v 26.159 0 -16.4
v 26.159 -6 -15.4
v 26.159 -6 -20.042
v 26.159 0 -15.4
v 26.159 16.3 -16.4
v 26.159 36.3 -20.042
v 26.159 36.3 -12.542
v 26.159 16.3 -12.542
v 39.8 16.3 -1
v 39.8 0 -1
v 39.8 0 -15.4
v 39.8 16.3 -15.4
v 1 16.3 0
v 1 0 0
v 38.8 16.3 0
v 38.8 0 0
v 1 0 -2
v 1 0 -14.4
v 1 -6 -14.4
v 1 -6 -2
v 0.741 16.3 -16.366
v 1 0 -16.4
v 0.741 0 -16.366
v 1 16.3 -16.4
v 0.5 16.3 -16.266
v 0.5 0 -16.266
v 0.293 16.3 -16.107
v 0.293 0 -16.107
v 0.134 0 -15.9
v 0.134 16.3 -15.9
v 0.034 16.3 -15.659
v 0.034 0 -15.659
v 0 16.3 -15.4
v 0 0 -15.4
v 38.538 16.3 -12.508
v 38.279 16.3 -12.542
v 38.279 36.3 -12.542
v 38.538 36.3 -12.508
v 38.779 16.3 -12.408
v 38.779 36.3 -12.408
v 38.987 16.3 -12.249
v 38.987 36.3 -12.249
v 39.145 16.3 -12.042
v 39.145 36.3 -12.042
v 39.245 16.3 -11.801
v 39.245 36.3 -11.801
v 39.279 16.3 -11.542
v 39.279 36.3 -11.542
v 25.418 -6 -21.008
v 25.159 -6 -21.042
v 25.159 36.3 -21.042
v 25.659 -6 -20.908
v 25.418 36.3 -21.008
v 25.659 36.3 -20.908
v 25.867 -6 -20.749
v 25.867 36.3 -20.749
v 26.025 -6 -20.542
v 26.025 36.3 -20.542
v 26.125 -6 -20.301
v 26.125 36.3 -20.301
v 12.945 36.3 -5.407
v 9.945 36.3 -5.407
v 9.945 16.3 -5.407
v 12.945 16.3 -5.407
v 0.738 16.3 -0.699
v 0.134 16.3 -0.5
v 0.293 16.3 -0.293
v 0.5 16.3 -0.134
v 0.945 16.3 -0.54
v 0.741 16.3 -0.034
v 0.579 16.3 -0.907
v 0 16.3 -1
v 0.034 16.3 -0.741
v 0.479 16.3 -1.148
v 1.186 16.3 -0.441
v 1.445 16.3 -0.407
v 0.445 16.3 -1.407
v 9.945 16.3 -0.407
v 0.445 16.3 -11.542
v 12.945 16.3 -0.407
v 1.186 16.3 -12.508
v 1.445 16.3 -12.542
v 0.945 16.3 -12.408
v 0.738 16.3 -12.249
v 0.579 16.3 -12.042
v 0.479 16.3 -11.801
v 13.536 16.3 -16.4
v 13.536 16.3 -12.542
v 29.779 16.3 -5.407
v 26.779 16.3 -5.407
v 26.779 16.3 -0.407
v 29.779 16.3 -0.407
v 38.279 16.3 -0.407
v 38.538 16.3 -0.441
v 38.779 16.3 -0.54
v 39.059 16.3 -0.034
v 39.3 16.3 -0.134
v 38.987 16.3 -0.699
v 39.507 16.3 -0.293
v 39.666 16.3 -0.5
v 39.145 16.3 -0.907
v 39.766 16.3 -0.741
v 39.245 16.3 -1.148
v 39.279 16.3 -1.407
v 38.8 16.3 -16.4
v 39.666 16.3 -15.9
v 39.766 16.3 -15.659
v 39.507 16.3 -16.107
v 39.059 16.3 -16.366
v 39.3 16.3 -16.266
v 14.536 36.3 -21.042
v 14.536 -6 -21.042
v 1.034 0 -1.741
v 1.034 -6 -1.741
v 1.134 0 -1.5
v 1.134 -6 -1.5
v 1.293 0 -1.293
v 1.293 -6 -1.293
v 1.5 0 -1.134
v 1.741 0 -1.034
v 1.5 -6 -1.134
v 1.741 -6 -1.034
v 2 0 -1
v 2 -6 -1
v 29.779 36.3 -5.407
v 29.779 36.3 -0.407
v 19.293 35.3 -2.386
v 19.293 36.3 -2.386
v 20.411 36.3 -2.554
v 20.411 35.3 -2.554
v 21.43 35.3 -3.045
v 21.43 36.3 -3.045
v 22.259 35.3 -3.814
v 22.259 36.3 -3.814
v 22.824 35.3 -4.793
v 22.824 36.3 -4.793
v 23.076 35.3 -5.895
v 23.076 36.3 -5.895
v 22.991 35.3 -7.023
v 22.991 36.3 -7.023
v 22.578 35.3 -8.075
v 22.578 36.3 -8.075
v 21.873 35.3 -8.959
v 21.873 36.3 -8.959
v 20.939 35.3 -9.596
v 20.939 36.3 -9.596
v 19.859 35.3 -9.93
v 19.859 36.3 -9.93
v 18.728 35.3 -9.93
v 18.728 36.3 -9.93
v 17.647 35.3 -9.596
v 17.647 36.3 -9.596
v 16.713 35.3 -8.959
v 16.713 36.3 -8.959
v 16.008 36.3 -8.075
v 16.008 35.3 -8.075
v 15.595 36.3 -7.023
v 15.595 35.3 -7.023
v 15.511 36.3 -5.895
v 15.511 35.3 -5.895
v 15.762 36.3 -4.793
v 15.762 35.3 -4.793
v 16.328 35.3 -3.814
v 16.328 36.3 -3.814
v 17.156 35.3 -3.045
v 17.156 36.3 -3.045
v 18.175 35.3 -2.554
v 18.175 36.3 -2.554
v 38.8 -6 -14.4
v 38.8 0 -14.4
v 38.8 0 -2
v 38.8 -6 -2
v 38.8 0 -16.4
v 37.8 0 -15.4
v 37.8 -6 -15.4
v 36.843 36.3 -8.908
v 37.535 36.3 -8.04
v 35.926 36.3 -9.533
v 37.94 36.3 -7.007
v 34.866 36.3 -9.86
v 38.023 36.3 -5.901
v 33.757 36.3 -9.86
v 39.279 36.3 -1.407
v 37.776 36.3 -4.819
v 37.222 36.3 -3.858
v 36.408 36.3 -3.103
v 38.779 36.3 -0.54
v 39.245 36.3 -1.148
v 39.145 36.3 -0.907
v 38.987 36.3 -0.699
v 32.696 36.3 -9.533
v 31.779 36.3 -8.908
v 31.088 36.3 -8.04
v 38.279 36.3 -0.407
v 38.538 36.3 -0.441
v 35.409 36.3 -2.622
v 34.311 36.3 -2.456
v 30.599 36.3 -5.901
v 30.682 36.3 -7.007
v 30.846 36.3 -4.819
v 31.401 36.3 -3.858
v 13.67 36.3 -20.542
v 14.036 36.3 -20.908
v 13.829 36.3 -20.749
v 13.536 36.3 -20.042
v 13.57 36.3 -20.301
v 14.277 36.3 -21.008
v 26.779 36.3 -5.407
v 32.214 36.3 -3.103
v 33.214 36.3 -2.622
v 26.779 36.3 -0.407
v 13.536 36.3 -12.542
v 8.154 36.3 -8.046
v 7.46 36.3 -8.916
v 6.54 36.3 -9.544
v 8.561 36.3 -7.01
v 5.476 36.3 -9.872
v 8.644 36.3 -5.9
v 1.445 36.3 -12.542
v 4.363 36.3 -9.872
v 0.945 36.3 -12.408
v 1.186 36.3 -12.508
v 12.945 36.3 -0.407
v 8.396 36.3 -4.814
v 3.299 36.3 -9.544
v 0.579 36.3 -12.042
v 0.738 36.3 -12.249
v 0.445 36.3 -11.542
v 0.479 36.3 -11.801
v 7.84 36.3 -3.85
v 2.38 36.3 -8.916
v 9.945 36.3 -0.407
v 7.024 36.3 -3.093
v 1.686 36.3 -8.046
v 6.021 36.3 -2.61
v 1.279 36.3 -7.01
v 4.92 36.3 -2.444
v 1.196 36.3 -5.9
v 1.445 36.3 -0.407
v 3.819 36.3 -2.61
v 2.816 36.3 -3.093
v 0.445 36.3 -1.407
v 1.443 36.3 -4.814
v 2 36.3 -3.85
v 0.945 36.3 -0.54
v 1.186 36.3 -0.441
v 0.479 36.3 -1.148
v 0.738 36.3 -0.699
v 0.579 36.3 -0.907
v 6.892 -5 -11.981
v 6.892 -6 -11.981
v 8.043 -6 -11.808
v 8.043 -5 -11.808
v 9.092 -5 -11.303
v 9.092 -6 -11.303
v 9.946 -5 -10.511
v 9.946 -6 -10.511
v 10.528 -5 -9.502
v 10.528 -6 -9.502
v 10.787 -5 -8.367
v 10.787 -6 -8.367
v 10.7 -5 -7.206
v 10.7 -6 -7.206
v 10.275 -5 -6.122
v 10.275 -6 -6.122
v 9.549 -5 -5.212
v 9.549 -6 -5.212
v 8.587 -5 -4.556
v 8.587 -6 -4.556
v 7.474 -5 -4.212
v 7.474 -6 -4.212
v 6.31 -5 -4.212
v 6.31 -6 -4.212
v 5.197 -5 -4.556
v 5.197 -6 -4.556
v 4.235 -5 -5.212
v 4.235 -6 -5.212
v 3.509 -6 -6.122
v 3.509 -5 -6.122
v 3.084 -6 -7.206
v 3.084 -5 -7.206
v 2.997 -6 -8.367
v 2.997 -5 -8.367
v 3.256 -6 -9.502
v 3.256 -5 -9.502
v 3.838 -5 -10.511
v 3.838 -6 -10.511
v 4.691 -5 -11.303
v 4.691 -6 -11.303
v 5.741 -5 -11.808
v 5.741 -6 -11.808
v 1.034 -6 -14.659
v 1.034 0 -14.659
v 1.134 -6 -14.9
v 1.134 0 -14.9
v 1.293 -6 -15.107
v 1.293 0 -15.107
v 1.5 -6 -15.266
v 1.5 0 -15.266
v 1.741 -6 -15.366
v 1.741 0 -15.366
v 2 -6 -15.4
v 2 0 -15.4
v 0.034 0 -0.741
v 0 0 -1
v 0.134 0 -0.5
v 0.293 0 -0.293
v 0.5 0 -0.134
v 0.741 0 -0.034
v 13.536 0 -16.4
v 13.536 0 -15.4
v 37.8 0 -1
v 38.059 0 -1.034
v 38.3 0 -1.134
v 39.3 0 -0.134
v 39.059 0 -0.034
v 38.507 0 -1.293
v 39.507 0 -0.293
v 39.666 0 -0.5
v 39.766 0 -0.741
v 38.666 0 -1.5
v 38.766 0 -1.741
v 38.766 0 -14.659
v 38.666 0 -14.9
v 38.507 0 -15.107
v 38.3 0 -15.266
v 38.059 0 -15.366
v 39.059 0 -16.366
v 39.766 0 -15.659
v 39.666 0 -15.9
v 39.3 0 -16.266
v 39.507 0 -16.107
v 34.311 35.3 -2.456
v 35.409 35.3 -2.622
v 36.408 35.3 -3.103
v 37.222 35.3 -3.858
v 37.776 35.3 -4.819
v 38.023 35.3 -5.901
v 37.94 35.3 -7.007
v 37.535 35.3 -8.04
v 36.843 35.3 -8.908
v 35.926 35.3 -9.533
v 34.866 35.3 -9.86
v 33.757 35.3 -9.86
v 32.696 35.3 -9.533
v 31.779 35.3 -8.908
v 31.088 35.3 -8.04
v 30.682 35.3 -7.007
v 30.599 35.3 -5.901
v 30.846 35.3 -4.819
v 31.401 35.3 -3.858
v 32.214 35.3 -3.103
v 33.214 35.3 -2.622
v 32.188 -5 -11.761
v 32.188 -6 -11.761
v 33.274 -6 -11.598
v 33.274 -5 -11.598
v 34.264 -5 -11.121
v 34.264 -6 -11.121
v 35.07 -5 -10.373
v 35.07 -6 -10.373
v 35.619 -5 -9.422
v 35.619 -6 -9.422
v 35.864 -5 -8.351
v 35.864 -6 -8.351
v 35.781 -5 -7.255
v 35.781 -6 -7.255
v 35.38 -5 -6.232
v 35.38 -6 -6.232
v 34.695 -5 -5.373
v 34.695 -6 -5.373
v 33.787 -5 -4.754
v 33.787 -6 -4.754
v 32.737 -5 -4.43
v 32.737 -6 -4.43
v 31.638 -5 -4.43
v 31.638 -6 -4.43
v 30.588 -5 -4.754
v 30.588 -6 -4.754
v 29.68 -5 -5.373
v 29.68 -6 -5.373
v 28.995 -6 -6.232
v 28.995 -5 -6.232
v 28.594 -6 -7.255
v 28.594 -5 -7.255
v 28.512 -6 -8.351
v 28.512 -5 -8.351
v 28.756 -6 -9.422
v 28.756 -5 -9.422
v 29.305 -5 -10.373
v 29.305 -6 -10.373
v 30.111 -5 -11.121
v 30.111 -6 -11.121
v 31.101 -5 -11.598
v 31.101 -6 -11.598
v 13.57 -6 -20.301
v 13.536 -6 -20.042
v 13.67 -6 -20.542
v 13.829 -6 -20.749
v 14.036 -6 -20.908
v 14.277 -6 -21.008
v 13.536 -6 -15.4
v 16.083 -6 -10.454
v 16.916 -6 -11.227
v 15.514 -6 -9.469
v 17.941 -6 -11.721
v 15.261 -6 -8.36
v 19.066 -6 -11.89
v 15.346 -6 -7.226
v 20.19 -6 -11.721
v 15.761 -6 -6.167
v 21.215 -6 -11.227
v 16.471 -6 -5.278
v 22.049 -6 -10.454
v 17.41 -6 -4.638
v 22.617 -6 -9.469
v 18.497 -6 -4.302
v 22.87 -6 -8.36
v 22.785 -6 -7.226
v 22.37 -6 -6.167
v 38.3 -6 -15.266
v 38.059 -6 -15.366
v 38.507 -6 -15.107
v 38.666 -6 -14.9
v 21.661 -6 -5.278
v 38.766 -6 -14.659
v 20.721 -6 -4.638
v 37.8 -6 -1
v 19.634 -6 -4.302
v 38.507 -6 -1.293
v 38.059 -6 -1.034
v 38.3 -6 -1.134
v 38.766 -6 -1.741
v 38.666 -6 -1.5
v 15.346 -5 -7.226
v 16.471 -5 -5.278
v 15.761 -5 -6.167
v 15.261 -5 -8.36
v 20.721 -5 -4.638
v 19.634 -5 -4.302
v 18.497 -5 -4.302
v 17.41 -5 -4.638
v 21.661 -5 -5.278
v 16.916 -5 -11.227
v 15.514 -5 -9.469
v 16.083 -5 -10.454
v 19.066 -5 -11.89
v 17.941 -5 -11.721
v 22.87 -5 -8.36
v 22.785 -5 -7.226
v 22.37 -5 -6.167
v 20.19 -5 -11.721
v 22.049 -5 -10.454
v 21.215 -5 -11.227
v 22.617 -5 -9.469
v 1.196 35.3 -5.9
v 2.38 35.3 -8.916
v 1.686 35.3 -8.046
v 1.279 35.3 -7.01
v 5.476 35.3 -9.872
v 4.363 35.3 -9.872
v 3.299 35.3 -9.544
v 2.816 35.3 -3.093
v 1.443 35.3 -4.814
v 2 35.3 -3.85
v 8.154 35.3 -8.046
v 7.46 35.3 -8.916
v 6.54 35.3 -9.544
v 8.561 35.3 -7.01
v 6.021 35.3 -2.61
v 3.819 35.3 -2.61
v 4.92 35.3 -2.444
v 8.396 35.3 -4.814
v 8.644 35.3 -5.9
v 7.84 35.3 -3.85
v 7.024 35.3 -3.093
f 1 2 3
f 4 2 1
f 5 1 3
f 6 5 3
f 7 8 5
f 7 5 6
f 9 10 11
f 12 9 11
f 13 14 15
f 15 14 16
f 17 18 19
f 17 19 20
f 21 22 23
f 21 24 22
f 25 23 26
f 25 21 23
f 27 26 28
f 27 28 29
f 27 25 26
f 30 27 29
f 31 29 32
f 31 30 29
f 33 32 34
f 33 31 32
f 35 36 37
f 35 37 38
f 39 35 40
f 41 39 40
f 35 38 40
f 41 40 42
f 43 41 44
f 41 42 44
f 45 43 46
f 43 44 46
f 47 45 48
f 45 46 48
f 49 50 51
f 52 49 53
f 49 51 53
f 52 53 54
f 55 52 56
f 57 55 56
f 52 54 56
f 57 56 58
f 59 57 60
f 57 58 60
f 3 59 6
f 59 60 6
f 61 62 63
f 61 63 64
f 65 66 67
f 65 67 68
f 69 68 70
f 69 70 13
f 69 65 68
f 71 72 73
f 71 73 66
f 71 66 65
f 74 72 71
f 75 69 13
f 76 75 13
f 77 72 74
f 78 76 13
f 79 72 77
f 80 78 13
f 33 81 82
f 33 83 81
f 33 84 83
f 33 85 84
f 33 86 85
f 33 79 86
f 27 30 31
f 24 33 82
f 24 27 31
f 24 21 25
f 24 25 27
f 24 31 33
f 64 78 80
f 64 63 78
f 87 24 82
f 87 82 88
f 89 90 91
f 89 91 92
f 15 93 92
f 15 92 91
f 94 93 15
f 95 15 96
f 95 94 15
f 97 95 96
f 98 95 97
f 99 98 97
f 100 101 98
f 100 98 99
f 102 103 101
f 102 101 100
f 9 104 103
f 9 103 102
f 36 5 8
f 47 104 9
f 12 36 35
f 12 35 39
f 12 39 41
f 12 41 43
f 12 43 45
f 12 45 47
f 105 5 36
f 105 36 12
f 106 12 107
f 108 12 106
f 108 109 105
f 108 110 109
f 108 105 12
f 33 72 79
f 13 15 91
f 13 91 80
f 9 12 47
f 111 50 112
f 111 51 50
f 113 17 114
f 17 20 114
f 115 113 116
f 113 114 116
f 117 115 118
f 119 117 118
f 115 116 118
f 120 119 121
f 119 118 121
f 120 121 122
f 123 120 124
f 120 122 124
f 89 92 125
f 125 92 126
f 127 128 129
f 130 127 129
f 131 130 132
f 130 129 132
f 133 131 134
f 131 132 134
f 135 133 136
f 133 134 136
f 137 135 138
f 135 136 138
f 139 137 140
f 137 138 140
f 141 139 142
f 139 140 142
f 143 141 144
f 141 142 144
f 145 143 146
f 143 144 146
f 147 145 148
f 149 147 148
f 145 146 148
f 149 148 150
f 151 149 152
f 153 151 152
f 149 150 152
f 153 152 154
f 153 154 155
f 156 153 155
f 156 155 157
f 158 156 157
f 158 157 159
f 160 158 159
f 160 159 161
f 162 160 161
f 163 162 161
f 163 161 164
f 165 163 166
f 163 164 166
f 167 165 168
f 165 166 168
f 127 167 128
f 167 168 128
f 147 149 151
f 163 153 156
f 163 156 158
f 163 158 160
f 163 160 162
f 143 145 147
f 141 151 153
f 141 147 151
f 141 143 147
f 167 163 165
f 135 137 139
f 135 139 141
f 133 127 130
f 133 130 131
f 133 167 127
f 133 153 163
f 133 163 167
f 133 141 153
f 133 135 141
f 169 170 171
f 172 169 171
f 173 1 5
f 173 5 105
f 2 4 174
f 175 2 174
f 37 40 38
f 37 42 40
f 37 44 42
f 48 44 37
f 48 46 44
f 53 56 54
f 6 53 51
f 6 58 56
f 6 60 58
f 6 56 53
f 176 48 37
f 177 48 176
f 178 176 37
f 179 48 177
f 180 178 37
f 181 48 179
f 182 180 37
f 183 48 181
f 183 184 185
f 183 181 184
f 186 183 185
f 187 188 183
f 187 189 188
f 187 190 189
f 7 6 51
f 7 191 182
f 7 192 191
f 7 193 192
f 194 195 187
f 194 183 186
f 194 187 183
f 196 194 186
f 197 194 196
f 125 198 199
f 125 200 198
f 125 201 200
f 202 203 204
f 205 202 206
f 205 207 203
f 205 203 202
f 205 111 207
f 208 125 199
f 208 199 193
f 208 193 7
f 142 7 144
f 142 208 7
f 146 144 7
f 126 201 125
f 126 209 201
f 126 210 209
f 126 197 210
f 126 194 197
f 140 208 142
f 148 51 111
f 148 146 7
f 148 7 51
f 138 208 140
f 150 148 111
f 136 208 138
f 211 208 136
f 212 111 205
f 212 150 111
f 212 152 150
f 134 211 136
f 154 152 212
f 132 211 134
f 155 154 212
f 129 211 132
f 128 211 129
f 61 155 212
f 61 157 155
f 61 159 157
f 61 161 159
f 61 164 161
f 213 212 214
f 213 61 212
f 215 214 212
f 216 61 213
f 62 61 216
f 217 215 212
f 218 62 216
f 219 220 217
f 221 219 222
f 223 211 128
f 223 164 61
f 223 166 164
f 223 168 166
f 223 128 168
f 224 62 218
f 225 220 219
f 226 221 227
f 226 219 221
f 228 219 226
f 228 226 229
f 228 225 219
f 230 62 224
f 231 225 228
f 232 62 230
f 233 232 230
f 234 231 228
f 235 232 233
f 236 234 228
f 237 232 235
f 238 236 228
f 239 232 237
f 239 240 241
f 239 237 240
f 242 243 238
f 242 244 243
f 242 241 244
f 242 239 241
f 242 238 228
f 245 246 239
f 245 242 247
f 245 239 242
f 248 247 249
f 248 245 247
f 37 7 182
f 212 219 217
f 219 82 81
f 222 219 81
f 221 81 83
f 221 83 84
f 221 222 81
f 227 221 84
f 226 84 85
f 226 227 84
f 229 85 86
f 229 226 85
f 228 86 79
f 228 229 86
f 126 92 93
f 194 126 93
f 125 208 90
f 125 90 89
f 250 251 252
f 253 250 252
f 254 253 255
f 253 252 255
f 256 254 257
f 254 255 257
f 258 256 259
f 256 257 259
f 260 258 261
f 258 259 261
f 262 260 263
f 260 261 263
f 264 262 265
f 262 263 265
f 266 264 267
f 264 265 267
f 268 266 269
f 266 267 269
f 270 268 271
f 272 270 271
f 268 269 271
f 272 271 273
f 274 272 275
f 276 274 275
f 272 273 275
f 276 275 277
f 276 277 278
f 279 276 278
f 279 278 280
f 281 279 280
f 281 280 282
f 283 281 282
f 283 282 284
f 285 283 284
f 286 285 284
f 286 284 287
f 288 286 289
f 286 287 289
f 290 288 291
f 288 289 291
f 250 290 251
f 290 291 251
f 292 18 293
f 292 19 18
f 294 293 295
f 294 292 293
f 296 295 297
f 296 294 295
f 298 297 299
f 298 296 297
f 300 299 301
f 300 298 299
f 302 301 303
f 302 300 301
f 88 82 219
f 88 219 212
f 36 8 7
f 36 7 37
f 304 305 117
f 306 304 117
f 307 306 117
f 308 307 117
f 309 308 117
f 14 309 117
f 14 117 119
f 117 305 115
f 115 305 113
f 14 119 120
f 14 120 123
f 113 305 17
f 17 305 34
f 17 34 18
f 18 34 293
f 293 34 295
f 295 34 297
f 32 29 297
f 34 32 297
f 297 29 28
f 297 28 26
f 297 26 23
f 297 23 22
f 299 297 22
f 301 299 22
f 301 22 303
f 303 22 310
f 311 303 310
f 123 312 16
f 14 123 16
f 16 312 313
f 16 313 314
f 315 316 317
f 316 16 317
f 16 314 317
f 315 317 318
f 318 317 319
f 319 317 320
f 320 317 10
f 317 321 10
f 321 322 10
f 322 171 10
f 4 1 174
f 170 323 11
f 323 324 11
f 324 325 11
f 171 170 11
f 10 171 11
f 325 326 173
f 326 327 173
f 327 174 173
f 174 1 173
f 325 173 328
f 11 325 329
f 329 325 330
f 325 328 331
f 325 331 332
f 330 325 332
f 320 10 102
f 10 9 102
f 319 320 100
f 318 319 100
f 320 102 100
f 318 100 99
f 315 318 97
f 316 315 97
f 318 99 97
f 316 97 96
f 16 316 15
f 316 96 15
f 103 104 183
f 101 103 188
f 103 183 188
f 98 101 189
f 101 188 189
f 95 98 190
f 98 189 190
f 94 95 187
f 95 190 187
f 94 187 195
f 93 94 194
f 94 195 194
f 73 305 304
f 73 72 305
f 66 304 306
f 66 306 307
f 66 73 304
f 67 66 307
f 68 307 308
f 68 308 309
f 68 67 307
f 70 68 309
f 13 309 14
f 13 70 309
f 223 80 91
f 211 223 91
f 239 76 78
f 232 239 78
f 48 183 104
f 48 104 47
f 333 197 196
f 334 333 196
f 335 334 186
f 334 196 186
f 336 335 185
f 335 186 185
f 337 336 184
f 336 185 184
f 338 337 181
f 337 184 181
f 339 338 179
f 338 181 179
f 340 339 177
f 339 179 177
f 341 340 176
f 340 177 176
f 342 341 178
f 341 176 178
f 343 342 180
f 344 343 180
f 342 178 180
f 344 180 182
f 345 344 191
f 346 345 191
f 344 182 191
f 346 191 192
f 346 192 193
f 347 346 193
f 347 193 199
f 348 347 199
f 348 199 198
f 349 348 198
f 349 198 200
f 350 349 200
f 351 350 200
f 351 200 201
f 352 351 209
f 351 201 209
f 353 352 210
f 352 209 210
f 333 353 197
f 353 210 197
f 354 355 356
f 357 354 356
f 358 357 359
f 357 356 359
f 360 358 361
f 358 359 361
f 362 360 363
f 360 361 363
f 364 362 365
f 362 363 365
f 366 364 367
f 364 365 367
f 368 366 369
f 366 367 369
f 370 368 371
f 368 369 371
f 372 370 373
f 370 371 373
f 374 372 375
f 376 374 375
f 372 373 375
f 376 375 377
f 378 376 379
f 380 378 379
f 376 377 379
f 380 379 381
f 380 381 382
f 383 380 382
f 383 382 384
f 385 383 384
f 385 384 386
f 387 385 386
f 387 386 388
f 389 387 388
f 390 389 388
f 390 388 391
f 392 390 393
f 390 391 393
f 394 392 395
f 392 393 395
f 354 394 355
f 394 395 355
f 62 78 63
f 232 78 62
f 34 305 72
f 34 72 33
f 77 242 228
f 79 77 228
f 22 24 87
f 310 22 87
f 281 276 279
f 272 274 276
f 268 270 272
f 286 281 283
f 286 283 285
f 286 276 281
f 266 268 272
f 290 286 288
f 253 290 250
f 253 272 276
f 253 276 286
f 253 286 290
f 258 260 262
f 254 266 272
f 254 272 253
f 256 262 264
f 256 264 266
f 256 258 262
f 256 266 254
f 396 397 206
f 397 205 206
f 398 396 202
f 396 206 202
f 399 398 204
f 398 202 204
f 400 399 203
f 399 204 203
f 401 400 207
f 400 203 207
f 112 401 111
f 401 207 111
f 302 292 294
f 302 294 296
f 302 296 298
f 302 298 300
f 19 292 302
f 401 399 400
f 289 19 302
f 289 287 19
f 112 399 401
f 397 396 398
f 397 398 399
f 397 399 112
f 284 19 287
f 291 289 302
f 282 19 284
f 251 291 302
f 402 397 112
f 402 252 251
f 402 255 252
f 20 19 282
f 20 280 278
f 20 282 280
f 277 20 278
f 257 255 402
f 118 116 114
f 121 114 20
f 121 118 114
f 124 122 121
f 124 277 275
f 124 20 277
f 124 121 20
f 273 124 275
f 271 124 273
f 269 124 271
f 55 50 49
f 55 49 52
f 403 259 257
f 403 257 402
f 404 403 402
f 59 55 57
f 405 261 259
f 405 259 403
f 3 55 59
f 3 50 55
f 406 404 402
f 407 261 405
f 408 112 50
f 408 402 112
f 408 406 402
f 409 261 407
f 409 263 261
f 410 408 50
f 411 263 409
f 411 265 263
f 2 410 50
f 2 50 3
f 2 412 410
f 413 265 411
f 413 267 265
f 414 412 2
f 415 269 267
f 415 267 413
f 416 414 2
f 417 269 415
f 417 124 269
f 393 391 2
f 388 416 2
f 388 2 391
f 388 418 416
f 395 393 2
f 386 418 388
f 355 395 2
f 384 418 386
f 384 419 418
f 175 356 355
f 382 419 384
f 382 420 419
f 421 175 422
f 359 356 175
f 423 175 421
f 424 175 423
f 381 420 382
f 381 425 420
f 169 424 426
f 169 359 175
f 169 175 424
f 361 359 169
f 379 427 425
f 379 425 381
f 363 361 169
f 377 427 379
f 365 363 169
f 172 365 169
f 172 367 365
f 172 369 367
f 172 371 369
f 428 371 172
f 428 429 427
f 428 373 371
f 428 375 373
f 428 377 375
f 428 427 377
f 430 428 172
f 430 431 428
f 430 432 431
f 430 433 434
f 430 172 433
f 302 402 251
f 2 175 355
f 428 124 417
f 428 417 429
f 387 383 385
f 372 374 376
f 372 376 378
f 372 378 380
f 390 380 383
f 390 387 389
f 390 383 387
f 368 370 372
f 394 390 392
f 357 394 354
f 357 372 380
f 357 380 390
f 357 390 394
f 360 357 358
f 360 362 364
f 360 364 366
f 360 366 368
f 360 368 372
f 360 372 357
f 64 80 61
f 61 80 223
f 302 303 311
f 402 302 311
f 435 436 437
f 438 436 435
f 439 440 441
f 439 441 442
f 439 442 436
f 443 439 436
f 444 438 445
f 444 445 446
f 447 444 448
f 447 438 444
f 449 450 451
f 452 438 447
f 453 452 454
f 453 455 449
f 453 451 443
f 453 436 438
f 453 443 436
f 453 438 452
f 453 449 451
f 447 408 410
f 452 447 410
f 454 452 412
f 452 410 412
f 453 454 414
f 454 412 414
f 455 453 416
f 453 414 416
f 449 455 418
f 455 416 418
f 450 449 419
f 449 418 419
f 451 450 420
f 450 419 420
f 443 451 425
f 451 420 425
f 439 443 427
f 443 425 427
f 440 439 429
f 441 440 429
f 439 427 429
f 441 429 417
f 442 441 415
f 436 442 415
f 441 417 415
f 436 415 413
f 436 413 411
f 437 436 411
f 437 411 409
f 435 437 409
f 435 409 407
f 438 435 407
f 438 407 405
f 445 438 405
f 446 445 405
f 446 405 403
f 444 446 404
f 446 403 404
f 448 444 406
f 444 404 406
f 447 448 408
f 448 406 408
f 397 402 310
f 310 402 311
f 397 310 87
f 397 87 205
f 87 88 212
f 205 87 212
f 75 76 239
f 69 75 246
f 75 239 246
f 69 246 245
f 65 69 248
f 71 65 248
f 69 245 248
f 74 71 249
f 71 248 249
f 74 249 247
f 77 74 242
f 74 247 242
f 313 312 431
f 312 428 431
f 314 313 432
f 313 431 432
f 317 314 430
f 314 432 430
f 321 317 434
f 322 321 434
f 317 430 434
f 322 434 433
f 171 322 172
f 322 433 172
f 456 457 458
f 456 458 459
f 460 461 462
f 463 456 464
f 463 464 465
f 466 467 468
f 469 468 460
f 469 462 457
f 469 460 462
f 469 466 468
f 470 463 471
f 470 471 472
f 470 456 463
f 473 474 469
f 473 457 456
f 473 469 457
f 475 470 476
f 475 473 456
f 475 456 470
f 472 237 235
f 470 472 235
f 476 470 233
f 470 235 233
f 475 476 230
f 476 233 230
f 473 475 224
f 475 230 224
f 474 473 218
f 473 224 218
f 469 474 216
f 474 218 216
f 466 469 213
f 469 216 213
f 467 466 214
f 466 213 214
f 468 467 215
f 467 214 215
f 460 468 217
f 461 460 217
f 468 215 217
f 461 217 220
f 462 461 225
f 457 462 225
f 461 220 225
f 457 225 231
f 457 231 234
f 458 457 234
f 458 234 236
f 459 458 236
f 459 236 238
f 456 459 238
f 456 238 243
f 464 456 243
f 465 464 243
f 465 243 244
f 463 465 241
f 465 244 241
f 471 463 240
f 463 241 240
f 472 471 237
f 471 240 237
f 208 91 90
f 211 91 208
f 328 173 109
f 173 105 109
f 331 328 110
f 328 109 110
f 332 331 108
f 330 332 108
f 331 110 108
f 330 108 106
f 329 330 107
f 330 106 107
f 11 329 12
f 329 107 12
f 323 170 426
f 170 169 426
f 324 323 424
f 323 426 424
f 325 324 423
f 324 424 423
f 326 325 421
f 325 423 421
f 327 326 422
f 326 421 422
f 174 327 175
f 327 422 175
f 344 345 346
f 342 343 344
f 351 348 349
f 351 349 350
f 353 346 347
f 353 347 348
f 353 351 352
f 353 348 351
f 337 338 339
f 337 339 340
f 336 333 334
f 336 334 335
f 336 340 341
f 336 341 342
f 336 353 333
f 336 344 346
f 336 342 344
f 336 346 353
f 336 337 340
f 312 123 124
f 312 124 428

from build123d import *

# Parameters (mm, degrees)
SKETCH_1_W          = 39.8
SKETCH_1_H          = 16.4
EXTRUDE_1_DEPTH     = 16.3
SKETCH_2_W          = 37.8
SKETCH_2_H          = 14.4
EXTRUDE_2_DEPTH     = 6
SKETCH_3_W          = 38.834721862
SKETCH_3_H          = 12.135850582
EXTRUDE_3_DEPTH     = 20
SKETCH_4_W          = 12.623118615
SKETCH_4_H          = 42.3
EXTRUDE_4_DEPTH     = 8.5
SKETCH_5_W          = 3
SKETCH_5_H          = 20
CUT_EXTRUDE_2_DEPTH = 5
SKETCH_6_R          = 3.734555691
SKETCH_6_R_2        = 3.793211722
SKETCH_6_R_3        = 3.72240449
CUT_EXTRUDE_3_DEPTH = 1
SKETCH_7_R          = 3.906226906
SKETCH_7_R_2        = 3.81532866
SKETCH_7_R_3        = 3.686295828
CUT_EXTRUDE_4_DEPTH = 1
FILLET_1_R          = 1


with BuildPart() as part:
    # ｽｹｯﾁ1 → ﾎﾞｽ - 押し出し1 (new body)
    with BuildSketch(Plane(origin=(0, 0, 0), x_dir=(1, 0, 0), z_dir=(0, 1, 0))):
        with Locations((19.9, 8.2)):
            Rectangle(SKETCH_1_W, SKETCH_1_H)
    extrude(amount=EXTRUDE_1_DEPTH)

    # ｽｹｯﾁ2 → ﾎﾞｽ - 押し出し2 (add)
    with BuildSketch(Plane.XZ):
        with Locations((19.9, -8.2)):
            Rectangle(SKETCH_2_W, SKETCH_2_H)
    extrude(amount=EXTRUDE_2_DEPTH)

    # ｽｹｯﾁ3 → ﾎﾞｽ - 押し出し3 (add)
    with BuildSketch(Plane(origin=(0, 16.3, 0), x_dir=(1, 0, 0), z_dir=(0, 1, 0))):
        with Locations((19.862075467, 6.474433745)):
            Rectangle(SKETCH_3_W, SKETCH_3_H)
    extrude(amount=EXTRUDE_3_DEPTH)

    # ｽｹｯﾁ4 → ﾎﾞｽ - 押し出し4 (add)
    with BuildSketch(Plane(origin=(0, 0, -12.542359036), x_dir=(-1, 0, 0), z_dir=(0, 0, -1))):
        with Locations((-19.847838353, 15.15)):
            Rectangle(SKETCH_4_W, SKETCH_4_H)
    extrude(amount=EXTRUDE_4_DEPTH)

    # ｽｹｯﾁ5 → ｶｯﾄ - 押し出し2 (cut)
    with BuildSketch(Plane.XY.offset(-0.406508454)):
        with Locations((11.444714536, 26.3)):
            Rectangle(SKETCH_5_W, SKETCH_5_H)
        with Locations((28.279436398, 26.3)):
            Rectangle(SKETCH_5_W, SKETCH_5_H)
    extrude(amount=-CUT_EXTRUDE_2_DEPTH, mode=Mode.SUBTRACT)

    # ｽｹｯﾁ6 → ｶｯﾄ - 押し出し3 (cut)
    with BuildSketch(Plane(origin=(0, 36.3, 0), x_dir=(1, 0, 0), z_dir=(0, 1, 0))):
        with Locations(Location((4.919809438, 6.178820482, 0), (0, 0, 270))):
            Circle(SKETCH_6_R)
        with Locations(Location((19.293207471, 6.178820482, 0), (0, 0, 270))):
            Circle(SKETCH_6_R_2)
        with Locations(Location((34.311322566, 6.178820482, 0), (0, 0, 270))):
            Circle(SKETCH_6_R_3)
    extrude(amount=-CUT_EXTRUDE_3_DEPTH, mode=Mode.SUBTRACT)

    # ｽｹｯﾁ7 → ｶｯﾄ - 押し出し4 (cut)
    with BuildSketch(Plane.XZ.offset(6)):
        with Locations(Location((6.891885157, -8.075047135, 0), (0, 0, 270))):
            Circle(SKETCH_7_R)
        with Locations(Location((19.065660272, -8.075047135, 0), (0, 0, 270))):
            Circle(SKETCH_7_R_2)
        with Locations(Location((32.187548714, -8.075047135, 0), (0, 0, 270))):
            Circle(SKETCH_7_R_3)
    extrude(amount=-CUT_EXTRUDE_4_DEPTH, mode=Mode.SUBTRACT)

    # ﾌｨﾚｯﾄ1
    fillet_1_edges = [part.edges().sort_by_distance(p)[0] for p in [
        (38.8, -3, -1),
        (1, -3, -1),
        (1, -3, -15.4),
        (38.8, -3, -15.4),
        (0.444714536, 26.3, -12.542359036),
        (0.444714536, 26.3, -0.406508454),
        (39.279436398, 26.3, -0.406508454),
        (39.279436398, 26.3, -12.542359036),
        (26.15939766, 15.15, -21.042359036),
        (13.536279045, 15.15, -21.042359036),
        (0, 8.15, -16.4),
        (39.8, 8.15, -16.4),
        (39.8, 8.15, 0),
        (0, 8.15, 0),
    ]]
    fillet(fillet_1_edges, radius=FILLET_1_R)


solid = part.part
